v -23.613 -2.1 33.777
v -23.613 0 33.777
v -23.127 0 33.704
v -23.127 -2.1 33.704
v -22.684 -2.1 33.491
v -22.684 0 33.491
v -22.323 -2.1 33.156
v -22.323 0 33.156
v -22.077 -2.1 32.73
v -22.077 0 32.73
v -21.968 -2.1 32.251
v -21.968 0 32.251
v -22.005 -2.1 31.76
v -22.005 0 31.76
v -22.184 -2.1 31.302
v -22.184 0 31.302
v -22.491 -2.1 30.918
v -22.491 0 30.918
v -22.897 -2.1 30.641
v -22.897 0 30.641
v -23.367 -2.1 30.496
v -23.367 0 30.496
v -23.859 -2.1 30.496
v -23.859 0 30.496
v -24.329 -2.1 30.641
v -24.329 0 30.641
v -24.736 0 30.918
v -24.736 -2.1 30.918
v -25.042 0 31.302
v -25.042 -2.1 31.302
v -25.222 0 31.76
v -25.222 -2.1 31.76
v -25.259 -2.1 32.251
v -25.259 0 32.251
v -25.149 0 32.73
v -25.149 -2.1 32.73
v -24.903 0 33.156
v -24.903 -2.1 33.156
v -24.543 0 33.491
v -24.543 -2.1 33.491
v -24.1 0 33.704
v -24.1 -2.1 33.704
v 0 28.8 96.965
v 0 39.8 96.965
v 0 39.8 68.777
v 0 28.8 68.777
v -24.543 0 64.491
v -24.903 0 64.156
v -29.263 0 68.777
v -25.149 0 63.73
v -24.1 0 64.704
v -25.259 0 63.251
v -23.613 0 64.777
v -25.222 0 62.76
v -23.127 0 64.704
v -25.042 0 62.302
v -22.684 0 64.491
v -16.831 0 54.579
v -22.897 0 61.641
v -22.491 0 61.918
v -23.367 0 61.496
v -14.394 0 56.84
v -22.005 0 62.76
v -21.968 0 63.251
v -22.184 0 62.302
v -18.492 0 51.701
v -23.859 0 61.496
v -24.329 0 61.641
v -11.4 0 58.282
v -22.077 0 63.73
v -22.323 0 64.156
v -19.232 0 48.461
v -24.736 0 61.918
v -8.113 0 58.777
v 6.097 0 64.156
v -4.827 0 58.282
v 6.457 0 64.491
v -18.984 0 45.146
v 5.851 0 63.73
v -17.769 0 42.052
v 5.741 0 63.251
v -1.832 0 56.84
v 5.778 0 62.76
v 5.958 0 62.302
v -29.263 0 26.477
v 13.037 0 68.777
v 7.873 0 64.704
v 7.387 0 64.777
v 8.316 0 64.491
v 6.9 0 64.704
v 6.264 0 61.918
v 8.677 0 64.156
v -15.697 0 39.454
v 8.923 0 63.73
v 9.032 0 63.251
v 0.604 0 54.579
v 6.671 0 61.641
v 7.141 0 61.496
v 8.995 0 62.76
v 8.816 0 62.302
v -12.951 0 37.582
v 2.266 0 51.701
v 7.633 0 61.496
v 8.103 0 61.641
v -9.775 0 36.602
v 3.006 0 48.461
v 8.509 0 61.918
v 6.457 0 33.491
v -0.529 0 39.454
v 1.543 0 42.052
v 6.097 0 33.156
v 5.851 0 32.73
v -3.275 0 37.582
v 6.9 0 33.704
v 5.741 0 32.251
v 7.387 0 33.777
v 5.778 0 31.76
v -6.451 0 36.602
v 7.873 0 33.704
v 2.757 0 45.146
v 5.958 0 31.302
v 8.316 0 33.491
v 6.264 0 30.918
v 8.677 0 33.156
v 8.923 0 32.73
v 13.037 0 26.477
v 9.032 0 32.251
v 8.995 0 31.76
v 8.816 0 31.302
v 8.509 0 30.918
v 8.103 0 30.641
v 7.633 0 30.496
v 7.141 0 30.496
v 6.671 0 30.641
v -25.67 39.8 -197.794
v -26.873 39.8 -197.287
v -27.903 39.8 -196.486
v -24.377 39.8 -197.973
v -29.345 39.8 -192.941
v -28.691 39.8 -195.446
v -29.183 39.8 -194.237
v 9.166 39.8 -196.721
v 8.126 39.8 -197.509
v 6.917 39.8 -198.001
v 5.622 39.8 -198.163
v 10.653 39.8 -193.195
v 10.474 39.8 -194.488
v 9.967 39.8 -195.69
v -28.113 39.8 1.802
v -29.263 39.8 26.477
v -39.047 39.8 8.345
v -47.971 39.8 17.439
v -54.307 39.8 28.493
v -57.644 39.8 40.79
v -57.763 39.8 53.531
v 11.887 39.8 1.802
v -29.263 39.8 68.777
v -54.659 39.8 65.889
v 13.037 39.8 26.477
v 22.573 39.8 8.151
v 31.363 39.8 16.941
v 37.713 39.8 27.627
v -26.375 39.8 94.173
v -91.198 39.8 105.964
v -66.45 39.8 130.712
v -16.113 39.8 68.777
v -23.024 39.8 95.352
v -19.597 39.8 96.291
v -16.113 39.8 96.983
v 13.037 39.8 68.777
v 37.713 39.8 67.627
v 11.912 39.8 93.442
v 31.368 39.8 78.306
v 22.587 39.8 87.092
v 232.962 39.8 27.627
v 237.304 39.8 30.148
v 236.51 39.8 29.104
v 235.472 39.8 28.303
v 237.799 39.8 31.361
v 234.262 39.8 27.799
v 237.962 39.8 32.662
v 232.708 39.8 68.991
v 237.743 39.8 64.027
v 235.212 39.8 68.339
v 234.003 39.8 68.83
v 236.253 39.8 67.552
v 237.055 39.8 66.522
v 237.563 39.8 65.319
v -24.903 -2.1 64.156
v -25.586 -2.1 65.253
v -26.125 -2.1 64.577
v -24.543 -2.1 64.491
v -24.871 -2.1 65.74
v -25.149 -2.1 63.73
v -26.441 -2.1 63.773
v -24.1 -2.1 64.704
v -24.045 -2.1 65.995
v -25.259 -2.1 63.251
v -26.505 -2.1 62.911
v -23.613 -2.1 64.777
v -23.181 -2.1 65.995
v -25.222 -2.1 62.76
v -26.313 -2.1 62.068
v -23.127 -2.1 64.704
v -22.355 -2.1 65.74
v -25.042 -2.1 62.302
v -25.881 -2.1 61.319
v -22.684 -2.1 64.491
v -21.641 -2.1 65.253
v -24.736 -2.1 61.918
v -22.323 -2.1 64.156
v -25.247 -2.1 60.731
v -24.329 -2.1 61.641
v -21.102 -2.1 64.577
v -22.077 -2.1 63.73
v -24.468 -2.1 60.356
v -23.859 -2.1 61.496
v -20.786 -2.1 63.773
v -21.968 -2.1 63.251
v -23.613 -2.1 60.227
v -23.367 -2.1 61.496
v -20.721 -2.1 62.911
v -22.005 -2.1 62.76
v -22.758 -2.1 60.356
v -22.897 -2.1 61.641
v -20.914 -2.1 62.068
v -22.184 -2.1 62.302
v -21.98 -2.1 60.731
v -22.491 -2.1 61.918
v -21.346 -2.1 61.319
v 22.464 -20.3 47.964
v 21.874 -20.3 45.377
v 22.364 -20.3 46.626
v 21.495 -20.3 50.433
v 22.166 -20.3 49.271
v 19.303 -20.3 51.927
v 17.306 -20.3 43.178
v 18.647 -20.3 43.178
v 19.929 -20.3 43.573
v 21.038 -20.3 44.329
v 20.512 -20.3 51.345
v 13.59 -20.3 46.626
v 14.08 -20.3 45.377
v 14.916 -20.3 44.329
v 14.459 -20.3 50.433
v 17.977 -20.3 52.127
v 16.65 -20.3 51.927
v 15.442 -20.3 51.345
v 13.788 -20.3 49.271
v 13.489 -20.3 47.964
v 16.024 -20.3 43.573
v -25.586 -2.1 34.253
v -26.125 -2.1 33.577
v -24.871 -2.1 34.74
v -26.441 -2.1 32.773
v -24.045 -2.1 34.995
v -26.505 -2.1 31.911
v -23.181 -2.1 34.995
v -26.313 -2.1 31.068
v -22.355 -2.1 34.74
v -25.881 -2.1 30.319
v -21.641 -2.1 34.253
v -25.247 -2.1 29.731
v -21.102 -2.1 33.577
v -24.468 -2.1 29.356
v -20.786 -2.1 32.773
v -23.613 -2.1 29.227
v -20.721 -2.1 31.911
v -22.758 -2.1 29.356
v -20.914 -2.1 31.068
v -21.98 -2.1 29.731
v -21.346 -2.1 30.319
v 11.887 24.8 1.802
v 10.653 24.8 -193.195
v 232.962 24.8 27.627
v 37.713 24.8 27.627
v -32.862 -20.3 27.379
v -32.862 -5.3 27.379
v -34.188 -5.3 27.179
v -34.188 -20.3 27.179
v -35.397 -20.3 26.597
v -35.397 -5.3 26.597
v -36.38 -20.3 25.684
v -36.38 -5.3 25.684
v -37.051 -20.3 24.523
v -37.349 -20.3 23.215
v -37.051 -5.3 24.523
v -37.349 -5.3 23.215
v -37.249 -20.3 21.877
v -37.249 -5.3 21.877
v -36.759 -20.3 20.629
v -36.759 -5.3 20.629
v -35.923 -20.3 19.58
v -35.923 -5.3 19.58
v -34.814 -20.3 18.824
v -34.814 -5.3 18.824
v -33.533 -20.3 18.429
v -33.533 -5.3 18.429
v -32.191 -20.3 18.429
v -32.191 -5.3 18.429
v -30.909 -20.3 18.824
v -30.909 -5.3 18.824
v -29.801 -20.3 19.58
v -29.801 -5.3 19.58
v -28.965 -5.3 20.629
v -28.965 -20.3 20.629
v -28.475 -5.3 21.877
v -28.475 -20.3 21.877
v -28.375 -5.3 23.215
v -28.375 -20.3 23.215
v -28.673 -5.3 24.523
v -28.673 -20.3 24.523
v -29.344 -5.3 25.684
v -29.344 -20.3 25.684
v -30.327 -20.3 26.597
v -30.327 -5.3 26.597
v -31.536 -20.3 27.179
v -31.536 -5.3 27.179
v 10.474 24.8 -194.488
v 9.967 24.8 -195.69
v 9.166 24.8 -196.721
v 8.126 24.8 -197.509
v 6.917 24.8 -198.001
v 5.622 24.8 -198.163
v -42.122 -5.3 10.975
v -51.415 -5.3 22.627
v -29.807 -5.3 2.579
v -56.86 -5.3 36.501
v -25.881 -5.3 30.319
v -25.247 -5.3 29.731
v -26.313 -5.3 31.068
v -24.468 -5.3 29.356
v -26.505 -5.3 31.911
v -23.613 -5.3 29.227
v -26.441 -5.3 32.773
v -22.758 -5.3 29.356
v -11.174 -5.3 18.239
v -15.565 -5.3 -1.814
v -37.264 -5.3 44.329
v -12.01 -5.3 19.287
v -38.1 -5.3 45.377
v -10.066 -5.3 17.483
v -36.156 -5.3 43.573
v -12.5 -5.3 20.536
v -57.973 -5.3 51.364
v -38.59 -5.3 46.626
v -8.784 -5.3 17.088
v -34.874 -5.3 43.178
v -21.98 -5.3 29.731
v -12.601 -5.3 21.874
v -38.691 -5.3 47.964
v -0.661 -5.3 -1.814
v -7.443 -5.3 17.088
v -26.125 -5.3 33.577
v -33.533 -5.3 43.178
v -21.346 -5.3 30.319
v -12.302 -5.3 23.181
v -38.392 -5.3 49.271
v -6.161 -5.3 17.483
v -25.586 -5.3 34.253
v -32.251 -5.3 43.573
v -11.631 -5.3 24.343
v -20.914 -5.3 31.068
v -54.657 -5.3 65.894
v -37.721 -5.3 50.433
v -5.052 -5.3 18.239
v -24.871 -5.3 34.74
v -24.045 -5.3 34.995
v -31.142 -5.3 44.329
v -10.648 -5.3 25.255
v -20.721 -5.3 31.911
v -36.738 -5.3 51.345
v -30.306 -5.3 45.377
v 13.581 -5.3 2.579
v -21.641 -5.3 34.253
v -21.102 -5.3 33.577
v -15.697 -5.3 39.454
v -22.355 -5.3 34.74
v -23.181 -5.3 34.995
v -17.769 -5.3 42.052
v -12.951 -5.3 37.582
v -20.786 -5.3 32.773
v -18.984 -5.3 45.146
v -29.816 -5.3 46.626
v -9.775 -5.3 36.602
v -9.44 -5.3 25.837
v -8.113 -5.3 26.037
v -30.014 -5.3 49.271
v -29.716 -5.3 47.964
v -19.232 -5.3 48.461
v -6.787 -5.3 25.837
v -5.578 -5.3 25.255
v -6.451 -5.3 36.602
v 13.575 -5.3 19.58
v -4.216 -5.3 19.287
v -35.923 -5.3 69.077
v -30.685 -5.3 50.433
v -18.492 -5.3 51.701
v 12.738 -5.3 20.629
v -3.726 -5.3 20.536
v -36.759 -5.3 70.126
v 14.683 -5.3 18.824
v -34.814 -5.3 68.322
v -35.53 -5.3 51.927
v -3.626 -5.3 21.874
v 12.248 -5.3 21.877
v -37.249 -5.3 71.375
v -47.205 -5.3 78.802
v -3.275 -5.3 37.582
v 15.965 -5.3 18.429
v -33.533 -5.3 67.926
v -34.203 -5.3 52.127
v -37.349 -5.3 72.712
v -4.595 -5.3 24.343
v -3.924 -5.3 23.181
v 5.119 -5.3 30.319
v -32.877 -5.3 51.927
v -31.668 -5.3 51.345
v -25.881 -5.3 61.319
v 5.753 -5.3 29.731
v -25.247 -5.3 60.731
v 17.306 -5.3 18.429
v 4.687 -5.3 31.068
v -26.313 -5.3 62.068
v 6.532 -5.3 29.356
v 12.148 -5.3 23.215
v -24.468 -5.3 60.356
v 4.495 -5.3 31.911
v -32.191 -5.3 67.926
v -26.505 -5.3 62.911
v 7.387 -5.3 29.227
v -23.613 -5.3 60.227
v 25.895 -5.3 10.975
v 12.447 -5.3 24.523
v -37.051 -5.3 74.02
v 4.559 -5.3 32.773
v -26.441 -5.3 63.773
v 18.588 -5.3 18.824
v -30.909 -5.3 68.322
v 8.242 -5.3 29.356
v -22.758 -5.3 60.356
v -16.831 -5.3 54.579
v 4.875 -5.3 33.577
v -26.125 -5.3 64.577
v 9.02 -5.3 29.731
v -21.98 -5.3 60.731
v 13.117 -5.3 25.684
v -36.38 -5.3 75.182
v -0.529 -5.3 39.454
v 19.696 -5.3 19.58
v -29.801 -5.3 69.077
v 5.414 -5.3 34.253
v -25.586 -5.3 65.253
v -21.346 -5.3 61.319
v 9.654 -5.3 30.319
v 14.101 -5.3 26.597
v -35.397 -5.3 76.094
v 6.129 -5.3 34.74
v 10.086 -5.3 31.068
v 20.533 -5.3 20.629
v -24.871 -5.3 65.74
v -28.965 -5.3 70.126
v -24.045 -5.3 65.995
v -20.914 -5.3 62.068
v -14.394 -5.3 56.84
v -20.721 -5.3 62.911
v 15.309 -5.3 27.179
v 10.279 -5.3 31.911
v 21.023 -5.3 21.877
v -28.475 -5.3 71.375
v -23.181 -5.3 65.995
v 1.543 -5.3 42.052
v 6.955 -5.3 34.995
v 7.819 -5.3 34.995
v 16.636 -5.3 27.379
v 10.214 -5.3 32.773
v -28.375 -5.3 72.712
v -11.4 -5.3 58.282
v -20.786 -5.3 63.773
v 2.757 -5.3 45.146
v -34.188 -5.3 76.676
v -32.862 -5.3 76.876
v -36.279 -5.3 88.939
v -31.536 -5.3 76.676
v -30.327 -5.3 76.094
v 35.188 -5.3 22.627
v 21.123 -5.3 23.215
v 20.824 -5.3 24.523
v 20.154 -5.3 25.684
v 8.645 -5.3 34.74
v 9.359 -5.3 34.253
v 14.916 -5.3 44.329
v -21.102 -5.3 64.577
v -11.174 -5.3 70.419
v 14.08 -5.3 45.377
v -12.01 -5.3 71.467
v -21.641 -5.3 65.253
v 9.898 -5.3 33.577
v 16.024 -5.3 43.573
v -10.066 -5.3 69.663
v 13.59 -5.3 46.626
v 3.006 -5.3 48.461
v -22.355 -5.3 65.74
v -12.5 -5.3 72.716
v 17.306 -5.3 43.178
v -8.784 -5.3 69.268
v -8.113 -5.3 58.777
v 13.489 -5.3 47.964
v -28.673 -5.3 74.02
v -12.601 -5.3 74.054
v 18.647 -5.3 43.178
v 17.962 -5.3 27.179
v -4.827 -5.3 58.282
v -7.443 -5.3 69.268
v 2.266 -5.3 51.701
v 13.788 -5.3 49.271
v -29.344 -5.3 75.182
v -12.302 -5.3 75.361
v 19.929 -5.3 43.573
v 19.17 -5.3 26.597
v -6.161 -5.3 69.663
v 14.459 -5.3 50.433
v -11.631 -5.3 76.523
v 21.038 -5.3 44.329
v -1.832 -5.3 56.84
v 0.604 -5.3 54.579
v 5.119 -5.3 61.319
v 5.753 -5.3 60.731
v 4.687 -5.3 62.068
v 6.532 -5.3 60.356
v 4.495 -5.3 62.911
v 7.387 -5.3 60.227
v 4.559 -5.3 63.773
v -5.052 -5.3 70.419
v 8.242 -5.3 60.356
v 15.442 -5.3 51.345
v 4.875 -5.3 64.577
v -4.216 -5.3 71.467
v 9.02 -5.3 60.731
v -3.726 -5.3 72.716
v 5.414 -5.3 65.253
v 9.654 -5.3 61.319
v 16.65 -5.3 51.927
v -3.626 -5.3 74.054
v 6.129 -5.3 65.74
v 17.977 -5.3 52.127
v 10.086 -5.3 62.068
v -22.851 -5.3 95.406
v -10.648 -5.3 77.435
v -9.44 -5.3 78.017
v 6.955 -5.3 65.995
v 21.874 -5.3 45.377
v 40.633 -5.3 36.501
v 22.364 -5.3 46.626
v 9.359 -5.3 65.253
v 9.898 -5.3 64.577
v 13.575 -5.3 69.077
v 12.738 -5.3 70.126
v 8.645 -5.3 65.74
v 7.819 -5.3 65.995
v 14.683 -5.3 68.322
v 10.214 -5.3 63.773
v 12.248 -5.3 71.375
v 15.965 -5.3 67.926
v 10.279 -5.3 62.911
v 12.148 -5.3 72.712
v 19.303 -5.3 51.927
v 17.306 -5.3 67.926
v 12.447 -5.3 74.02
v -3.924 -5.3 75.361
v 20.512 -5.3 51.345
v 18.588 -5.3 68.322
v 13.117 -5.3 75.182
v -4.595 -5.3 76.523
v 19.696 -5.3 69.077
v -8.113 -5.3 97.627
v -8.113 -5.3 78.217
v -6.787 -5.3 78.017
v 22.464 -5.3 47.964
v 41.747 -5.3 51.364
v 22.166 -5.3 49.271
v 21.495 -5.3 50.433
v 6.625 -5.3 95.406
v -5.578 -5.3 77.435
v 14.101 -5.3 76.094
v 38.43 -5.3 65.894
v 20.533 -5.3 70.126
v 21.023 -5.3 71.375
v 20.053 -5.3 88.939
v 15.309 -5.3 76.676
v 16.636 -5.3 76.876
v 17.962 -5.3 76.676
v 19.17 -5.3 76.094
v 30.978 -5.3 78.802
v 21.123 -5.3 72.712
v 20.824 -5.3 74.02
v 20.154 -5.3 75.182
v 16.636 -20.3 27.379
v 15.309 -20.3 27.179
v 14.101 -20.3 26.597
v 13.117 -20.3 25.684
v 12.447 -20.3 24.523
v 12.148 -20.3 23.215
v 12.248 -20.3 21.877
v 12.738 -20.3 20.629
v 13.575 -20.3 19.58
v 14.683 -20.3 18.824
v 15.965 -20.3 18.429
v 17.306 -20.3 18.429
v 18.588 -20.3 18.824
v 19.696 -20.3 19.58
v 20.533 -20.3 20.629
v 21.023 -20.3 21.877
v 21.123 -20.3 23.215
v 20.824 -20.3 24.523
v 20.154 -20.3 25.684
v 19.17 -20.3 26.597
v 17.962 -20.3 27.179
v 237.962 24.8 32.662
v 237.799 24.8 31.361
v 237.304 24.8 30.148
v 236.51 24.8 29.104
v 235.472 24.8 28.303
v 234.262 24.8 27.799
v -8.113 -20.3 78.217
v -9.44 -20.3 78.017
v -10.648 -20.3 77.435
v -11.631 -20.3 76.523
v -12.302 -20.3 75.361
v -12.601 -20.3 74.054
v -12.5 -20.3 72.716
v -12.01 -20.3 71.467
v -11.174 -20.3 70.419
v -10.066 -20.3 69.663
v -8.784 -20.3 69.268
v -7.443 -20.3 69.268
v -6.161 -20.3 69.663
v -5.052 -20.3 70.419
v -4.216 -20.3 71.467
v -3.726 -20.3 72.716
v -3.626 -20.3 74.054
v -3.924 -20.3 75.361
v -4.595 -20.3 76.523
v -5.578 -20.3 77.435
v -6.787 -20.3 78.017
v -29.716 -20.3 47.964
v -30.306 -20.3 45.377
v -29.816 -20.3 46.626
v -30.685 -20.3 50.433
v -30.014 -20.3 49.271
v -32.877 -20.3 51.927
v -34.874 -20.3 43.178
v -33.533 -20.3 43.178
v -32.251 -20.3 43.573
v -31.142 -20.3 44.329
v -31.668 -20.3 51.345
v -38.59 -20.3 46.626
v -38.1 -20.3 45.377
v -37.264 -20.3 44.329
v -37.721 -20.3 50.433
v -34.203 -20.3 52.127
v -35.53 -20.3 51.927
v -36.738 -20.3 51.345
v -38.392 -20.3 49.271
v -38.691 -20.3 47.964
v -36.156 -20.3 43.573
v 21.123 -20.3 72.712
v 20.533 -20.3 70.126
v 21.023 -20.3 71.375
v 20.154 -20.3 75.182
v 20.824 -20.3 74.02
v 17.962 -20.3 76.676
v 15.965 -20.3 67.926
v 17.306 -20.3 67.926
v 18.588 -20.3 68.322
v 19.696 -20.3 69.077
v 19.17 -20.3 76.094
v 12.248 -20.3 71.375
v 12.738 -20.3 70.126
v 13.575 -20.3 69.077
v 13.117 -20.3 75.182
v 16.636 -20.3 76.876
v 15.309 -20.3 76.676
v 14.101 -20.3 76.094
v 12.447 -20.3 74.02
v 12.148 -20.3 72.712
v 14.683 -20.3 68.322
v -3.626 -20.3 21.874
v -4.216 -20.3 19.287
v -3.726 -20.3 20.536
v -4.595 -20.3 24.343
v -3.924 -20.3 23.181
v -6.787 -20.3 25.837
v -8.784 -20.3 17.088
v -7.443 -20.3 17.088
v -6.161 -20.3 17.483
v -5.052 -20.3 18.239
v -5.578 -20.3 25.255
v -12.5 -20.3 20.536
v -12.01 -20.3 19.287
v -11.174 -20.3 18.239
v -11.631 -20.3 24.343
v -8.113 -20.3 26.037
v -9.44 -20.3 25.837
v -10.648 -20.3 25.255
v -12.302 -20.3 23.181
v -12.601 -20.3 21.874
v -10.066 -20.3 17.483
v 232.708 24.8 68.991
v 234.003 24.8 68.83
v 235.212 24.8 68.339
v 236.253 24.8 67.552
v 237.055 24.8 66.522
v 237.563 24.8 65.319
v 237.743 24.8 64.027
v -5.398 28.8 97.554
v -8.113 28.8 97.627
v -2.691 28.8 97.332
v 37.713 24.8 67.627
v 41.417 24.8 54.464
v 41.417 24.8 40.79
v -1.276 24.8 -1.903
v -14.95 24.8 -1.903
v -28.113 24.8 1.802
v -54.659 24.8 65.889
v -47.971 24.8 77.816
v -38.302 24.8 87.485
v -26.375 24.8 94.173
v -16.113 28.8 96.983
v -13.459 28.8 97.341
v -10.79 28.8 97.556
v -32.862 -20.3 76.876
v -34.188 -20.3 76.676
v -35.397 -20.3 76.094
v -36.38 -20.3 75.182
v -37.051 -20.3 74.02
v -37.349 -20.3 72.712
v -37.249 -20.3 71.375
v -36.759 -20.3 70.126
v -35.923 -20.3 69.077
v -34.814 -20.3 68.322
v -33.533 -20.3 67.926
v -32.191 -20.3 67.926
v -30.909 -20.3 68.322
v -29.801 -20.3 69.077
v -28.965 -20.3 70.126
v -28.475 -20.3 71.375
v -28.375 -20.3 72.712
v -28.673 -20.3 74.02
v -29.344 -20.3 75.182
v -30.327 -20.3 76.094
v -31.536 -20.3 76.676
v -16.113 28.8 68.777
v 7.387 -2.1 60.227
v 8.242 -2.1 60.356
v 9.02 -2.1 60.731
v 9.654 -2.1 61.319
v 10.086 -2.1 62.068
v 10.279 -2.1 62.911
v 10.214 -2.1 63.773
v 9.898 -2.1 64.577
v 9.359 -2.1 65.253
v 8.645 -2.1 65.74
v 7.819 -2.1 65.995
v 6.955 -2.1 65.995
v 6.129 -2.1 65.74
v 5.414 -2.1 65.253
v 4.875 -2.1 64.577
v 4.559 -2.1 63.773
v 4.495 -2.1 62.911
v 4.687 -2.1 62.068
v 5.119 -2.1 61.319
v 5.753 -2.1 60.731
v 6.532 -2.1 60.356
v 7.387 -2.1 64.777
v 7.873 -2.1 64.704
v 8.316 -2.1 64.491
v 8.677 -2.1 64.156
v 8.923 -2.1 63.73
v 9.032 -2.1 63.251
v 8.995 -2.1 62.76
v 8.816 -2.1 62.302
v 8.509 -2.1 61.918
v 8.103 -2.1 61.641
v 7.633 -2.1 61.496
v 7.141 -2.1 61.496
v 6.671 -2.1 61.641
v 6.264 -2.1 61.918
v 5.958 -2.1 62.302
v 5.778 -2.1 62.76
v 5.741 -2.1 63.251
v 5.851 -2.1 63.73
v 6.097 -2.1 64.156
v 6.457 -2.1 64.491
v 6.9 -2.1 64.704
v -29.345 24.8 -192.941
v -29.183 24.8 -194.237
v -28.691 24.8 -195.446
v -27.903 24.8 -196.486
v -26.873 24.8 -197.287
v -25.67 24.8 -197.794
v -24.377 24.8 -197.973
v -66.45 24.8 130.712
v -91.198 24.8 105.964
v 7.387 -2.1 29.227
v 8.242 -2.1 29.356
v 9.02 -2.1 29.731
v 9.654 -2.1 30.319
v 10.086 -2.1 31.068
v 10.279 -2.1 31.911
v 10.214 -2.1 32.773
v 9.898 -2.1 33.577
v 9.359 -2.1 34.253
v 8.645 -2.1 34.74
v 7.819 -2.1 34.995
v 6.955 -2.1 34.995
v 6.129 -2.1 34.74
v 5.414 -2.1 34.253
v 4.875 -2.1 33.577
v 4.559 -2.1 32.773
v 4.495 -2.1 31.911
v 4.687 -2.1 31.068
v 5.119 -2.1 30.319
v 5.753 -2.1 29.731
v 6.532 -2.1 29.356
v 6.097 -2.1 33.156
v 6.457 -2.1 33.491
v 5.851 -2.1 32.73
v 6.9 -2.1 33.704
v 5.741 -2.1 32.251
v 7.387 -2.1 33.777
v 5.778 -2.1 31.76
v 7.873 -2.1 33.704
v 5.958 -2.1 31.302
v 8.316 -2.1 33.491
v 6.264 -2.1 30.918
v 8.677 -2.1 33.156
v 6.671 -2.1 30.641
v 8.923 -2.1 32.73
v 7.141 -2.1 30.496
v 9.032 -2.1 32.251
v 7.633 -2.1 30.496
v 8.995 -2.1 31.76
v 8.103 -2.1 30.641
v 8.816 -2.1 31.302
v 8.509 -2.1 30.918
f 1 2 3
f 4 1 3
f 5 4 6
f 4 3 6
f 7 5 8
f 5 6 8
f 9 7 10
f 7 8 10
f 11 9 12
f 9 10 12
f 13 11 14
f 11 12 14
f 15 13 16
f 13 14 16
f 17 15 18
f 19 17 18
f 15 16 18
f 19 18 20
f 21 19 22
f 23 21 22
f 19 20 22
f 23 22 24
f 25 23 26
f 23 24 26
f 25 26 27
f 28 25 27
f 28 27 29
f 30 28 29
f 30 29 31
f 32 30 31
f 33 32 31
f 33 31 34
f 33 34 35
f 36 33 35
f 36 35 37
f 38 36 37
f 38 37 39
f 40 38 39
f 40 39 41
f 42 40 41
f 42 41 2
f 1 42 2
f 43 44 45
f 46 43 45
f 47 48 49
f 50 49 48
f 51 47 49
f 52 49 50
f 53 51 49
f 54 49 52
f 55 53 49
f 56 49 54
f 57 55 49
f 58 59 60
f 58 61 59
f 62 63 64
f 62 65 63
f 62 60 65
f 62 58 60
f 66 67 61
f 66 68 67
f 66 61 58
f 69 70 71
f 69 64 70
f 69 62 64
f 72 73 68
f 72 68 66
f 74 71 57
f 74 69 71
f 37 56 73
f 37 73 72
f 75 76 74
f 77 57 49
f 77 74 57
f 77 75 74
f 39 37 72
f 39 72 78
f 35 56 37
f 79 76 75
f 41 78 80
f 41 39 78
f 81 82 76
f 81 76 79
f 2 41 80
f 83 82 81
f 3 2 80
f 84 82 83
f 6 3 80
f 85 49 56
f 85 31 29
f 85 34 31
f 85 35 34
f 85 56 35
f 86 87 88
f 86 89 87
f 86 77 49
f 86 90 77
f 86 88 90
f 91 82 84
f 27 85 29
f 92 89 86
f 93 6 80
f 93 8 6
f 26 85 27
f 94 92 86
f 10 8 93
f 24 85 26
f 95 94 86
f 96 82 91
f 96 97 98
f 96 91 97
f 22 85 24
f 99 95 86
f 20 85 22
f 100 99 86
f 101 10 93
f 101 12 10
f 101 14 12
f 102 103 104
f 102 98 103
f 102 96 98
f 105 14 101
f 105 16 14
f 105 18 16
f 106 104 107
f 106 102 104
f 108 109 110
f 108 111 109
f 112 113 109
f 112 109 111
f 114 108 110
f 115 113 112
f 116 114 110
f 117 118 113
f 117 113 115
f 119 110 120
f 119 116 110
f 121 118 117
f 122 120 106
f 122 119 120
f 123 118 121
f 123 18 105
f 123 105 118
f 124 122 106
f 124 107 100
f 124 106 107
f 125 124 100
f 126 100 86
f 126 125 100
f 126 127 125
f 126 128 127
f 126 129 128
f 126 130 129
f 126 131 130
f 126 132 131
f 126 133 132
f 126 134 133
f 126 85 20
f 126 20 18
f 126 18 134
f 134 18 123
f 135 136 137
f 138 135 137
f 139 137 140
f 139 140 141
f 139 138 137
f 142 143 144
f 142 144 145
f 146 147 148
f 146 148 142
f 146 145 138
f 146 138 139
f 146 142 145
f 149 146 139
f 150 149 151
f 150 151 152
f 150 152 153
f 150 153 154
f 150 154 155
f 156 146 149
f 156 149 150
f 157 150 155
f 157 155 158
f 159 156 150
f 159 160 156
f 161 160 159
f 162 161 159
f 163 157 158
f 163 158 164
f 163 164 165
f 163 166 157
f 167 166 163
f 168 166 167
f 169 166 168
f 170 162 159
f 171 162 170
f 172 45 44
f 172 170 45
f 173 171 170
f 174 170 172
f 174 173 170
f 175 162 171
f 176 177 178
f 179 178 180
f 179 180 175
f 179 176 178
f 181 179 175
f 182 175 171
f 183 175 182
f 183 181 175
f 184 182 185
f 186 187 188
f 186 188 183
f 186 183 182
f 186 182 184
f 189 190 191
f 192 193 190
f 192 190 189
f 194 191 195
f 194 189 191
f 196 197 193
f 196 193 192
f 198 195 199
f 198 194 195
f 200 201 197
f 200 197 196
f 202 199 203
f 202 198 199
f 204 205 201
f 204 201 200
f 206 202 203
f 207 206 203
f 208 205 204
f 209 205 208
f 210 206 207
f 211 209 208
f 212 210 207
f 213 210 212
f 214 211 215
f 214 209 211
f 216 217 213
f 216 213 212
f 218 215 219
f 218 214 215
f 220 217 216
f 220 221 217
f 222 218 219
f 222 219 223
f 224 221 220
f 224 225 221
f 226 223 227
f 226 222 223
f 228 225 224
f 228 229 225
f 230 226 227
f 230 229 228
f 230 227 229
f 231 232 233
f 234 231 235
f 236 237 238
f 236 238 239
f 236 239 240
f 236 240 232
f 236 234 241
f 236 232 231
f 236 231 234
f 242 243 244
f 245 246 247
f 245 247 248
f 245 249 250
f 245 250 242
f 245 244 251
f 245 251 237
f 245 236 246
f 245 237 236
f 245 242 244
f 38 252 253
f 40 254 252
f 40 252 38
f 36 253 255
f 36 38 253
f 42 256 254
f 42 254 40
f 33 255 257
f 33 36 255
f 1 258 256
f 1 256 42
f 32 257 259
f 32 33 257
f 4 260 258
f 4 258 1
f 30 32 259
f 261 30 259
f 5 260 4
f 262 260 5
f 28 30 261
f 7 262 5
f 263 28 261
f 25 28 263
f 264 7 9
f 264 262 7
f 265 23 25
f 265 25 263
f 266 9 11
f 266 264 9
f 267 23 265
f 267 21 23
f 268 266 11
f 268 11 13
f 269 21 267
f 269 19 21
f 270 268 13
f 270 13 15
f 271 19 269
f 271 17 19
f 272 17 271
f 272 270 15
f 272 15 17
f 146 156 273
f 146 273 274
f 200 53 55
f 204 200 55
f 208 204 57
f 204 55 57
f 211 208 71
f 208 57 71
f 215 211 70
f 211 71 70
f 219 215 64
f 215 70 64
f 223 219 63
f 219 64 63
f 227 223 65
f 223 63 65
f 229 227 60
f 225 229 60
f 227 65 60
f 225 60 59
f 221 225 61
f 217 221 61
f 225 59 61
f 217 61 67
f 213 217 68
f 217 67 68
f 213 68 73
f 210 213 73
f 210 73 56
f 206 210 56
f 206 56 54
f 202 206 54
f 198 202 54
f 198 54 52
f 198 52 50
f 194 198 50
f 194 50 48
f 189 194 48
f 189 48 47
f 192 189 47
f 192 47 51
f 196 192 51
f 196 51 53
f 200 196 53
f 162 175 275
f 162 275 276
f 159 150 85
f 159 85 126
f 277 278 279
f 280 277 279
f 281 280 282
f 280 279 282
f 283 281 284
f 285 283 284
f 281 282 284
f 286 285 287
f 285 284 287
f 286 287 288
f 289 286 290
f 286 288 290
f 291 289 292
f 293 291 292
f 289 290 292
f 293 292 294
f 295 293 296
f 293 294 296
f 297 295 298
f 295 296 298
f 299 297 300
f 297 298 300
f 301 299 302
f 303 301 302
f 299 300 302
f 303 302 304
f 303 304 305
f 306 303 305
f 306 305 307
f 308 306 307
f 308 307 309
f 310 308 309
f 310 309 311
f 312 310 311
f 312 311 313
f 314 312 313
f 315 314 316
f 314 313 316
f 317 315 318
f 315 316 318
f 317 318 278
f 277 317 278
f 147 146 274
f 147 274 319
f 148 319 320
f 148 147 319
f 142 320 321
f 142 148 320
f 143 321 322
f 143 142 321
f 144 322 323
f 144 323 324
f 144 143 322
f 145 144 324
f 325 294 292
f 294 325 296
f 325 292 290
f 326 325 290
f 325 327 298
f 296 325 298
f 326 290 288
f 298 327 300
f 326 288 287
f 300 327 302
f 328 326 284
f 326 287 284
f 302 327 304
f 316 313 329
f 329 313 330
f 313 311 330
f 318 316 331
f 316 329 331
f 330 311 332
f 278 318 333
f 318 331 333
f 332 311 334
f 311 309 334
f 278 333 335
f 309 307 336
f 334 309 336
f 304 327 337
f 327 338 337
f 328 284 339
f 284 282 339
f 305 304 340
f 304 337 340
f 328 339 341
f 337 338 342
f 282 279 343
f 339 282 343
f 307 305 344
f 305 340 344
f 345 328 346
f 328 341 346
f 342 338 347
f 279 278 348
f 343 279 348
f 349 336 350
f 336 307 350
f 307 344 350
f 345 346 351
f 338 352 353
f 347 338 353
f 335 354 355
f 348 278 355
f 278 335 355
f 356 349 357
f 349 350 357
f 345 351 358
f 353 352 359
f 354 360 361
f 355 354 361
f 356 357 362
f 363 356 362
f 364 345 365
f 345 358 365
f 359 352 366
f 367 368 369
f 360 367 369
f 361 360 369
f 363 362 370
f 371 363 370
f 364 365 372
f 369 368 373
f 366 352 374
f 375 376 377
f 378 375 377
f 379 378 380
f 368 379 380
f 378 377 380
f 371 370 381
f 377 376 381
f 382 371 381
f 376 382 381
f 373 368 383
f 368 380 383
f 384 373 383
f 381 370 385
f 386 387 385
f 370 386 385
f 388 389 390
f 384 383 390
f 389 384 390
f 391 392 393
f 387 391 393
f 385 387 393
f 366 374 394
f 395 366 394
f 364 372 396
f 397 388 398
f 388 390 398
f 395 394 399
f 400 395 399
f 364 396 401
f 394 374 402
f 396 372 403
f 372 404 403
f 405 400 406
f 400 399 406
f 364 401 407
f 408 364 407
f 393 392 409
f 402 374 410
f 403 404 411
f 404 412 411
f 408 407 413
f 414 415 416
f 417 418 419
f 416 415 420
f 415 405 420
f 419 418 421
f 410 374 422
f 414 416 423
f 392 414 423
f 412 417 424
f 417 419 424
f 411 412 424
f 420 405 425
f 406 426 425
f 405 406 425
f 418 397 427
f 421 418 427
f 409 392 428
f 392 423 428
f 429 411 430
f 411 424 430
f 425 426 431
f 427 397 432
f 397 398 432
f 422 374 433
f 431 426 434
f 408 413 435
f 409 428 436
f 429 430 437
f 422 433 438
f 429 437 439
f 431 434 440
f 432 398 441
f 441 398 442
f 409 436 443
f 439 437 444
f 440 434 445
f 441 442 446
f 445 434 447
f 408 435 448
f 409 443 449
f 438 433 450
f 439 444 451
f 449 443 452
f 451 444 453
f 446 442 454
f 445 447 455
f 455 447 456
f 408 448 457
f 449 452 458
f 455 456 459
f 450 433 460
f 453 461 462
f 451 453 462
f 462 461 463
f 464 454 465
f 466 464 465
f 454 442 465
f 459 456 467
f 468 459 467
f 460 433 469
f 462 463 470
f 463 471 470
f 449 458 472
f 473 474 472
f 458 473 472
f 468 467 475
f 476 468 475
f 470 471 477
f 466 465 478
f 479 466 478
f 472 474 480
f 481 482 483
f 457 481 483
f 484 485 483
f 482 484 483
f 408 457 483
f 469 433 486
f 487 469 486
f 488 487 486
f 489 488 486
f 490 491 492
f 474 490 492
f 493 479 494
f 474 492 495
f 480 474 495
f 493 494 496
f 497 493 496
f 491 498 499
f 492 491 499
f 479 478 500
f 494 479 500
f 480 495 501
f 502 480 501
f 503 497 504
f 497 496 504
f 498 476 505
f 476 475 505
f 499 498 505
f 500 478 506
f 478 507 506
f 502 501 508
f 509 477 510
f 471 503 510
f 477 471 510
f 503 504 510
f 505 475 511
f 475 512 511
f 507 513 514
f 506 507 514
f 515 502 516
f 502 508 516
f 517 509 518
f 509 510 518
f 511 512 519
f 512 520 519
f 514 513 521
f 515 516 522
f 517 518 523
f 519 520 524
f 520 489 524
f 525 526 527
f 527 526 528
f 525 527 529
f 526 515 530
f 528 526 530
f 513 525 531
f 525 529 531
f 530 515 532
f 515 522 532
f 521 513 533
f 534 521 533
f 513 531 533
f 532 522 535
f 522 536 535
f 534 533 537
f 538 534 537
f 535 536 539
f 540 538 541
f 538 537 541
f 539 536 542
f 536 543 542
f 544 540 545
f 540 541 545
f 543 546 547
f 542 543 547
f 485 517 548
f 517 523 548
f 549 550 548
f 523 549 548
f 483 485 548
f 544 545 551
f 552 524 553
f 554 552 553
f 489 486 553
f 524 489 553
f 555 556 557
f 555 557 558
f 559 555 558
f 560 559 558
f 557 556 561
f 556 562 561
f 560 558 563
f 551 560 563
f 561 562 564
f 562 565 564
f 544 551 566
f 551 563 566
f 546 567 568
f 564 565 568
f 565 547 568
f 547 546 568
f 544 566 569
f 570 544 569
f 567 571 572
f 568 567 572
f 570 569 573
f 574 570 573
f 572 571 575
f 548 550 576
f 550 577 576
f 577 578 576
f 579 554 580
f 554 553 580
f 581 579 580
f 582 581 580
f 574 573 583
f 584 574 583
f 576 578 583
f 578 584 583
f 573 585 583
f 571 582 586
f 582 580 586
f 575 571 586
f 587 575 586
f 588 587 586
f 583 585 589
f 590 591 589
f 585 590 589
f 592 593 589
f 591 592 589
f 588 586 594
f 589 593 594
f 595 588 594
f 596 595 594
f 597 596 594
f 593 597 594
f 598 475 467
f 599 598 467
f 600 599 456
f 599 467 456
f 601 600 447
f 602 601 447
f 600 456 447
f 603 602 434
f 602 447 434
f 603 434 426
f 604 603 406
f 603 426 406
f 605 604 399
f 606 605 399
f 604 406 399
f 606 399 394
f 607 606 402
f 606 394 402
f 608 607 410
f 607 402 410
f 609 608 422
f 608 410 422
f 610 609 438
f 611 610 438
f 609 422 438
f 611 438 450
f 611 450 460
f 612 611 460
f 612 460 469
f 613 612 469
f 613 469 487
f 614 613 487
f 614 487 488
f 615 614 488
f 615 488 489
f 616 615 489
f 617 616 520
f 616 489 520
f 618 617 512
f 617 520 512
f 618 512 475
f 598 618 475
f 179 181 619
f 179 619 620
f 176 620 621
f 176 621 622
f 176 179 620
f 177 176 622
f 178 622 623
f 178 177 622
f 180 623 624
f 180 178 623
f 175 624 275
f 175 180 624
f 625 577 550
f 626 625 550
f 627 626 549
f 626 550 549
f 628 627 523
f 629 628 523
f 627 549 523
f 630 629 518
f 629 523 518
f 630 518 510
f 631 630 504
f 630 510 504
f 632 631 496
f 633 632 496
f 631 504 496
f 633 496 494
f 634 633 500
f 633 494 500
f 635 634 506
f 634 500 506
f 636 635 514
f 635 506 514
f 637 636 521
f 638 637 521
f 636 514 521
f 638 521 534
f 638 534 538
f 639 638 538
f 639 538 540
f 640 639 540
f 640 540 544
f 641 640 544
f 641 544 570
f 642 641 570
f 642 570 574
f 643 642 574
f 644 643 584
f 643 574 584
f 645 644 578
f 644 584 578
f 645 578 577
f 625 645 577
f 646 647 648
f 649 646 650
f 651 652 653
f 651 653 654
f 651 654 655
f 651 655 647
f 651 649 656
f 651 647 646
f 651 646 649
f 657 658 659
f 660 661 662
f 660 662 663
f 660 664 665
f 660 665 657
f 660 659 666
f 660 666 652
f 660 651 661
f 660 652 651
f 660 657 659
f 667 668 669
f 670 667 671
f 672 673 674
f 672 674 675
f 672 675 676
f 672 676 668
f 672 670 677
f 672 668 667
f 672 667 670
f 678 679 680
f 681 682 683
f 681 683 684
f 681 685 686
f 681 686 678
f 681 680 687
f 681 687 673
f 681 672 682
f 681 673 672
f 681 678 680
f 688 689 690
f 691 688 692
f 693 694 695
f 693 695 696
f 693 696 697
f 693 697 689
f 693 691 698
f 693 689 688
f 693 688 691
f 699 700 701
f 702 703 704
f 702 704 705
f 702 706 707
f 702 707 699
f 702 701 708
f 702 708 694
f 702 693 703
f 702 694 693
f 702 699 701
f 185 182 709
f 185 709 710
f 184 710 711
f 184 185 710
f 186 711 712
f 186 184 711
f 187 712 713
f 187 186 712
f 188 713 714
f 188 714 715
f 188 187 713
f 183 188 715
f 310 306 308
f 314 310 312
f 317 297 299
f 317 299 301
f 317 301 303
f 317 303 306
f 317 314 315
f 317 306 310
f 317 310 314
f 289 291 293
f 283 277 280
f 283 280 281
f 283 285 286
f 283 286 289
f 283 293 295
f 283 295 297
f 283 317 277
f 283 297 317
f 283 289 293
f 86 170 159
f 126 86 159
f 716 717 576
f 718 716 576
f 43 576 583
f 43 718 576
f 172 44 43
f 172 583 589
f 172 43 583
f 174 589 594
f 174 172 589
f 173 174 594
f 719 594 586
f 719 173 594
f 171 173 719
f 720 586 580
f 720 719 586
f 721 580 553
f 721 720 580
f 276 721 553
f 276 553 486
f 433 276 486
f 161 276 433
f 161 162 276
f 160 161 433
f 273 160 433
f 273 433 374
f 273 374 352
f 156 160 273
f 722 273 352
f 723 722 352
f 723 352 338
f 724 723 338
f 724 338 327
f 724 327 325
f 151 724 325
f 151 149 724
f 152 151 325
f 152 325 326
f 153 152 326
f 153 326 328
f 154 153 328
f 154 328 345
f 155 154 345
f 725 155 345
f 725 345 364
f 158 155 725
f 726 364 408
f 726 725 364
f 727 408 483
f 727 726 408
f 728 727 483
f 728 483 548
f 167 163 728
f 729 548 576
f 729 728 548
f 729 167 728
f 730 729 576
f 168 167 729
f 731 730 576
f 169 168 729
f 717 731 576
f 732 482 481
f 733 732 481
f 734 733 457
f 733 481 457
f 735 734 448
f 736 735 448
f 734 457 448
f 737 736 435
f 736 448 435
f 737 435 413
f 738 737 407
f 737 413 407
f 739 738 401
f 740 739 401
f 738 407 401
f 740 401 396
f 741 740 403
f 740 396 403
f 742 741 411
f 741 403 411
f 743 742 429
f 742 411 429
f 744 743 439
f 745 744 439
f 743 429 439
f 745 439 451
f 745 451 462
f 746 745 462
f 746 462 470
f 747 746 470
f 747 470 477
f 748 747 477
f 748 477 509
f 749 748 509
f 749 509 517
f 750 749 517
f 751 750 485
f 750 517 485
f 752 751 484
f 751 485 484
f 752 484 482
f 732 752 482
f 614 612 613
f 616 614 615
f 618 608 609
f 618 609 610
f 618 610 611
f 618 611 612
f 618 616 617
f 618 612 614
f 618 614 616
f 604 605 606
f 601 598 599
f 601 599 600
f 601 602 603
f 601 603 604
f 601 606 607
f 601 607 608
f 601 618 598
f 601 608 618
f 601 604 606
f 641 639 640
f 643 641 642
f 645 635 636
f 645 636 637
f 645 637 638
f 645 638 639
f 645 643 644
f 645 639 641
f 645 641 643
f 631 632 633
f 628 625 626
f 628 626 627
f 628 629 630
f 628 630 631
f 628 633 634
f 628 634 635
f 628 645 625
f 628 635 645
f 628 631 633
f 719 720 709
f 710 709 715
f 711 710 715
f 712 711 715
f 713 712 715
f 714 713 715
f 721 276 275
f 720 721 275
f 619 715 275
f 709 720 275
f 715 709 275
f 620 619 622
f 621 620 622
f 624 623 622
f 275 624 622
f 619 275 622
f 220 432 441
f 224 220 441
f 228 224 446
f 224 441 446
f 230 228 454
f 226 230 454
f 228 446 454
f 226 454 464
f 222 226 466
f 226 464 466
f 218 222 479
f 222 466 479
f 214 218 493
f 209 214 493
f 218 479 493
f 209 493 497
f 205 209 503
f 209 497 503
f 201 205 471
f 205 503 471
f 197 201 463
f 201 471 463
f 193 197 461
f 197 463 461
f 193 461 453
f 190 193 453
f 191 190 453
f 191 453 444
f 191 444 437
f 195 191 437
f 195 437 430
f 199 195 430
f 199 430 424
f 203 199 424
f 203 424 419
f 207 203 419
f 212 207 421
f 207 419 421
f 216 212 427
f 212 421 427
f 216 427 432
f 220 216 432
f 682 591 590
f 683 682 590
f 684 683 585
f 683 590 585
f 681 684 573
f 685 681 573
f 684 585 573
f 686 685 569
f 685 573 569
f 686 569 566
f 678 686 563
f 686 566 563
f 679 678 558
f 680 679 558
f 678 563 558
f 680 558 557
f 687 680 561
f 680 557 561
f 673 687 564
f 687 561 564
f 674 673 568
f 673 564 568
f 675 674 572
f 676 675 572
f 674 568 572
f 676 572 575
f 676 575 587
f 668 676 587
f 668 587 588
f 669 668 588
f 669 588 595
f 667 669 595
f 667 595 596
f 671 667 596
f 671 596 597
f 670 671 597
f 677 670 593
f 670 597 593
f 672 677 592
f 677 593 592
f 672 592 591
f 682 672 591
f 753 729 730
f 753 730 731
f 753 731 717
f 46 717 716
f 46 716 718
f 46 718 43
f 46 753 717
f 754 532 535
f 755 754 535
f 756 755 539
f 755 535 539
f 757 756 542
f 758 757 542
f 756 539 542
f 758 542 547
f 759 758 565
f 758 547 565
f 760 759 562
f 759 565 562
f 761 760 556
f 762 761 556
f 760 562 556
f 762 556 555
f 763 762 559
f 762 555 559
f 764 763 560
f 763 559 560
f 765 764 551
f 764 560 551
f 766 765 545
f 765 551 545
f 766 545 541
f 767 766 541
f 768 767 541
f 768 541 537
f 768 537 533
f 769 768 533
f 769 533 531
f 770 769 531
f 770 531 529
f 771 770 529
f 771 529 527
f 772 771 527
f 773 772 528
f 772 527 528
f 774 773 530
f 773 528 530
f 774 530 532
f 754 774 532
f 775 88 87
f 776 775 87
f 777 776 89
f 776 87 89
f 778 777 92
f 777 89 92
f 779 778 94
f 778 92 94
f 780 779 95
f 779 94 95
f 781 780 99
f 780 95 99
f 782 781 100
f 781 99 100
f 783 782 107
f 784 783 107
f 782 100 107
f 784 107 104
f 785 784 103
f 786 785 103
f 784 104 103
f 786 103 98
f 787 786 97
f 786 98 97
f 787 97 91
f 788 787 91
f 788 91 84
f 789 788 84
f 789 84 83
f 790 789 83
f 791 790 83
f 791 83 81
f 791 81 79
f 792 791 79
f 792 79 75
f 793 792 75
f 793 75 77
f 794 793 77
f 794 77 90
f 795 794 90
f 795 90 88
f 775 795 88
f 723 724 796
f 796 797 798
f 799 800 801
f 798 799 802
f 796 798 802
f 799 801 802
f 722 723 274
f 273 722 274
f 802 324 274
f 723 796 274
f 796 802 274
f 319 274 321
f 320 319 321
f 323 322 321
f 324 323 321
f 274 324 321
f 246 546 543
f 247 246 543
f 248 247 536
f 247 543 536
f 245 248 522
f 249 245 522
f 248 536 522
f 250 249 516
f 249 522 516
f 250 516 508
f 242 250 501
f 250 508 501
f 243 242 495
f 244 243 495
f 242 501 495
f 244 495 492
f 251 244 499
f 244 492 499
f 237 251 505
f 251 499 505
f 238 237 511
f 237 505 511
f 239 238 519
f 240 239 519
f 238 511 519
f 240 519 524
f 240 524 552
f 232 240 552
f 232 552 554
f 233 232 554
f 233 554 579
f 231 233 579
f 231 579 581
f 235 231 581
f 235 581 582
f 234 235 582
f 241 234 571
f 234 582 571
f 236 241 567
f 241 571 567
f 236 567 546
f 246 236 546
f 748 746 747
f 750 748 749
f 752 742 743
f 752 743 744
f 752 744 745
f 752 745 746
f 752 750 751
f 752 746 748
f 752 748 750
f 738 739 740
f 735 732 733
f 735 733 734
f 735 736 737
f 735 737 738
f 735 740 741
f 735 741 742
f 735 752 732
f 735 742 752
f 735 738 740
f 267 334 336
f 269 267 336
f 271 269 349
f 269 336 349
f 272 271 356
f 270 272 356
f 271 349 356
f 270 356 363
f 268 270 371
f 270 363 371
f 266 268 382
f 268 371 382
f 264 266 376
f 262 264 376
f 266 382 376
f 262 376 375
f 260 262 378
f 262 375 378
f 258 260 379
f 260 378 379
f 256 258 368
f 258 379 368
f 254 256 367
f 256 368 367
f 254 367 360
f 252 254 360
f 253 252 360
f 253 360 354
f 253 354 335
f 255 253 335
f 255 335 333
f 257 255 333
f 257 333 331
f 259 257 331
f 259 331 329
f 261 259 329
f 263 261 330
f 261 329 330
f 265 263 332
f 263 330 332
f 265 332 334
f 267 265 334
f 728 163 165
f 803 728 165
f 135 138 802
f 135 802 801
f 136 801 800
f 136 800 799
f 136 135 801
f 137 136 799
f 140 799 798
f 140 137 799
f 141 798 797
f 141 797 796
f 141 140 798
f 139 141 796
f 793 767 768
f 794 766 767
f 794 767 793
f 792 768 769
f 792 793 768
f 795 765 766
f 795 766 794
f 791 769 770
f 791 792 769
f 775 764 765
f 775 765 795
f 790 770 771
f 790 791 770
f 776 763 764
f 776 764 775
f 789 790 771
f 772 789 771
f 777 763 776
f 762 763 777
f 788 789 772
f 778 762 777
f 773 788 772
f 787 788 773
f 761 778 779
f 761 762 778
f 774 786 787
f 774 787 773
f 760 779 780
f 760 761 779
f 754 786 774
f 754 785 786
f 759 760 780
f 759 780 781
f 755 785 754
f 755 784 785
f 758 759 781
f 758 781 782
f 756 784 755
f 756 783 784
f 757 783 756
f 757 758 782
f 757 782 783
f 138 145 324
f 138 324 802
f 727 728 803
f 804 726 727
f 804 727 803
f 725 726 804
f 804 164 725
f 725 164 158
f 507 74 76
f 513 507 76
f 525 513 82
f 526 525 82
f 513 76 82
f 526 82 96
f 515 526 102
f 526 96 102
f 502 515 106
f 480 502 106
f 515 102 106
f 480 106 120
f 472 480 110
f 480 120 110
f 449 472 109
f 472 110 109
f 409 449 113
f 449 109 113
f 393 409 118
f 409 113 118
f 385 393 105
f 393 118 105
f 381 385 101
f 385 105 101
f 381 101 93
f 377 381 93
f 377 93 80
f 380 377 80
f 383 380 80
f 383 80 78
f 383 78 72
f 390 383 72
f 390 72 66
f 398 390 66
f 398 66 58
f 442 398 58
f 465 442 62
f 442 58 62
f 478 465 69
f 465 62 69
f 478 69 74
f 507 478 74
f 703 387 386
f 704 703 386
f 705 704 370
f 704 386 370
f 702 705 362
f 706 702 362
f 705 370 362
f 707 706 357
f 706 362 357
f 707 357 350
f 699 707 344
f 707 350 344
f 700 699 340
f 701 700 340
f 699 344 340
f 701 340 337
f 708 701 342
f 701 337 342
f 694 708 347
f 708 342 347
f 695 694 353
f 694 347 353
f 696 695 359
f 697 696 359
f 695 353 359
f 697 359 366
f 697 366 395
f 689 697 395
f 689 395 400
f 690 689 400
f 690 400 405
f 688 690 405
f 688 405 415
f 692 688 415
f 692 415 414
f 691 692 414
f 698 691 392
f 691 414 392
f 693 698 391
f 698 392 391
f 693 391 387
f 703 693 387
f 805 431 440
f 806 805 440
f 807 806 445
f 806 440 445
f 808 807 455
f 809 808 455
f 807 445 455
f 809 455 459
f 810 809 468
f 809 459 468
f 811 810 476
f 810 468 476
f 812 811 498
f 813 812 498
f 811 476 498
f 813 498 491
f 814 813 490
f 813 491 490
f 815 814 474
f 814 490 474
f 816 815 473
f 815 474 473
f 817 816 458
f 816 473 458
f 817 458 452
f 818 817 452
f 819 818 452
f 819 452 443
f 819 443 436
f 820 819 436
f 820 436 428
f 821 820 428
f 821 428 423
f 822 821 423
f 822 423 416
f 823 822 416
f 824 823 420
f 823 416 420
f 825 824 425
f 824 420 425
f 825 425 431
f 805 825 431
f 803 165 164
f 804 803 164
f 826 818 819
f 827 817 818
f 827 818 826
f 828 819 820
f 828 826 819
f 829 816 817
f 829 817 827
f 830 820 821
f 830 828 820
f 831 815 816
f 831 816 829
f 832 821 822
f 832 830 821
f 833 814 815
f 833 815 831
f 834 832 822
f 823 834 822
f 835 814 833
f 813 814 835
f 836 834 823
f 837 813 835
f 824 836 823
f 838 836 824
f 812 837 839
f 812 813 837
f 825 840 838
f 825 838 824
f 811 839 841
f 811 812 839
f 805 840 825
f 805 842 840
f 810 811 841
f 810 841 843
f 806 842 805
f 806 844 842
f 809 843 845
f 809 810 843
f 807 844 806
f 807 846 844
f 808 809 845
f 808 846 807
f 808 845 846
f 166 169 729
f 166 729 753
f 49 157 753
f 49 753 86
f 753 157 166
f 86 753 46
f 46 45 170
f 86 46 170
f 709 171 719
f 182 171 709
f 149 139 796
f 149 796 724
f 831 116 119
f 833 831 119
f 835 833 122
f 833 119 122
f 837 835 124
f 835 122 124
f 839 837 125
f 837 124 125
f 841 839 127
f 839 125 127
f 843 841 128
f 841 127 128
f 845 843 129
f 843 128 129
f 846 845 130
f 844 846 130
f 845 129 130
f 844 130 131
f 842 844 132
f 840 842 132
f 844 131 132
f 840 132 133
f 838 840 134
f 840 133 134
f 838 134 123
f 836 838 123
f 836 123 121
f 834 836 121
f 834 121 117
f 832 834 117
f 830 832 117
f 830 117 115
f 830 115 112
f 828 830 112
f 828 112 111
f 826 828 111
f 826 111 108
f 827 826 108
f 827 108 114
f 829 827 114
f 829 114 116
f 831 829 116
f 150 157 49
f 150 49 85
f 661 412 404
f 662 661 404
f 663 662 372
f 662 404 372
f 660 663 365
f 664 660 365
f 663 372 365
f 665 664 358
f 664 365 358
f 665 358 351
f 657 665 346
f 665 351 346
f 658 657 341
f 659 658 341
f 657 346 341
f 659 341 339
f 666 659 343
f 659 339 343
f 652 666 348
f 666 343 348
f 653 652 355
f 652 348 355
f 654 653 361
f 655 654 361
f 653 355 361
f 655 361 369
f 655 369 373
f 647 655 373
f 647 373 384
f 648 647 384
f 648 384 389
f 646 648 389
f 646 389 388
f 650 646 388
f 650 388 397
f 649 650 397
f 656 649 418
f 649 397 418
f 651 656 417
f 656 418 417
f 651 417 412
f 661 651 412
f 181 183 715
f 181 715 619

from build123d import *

# Parameters (mm, degrees)
SKETCH4_R           = 50
BOSS_EXTRUDE3_DEPTH = 45.1
SKETCH16_R          = 4.5
BOSS_EXTRUDE5_DEPTH = 15
CUT_EXTRUDE1_DEPTH  = 39.8
SKETCH7_W           = 16.113230219
SKETCH7_H           = 35.470323835
CUT_EXTRUDE3_DEPTH  = 11
SKETCH8_R           = 11.15
SKETCH8_R_2         = 1.65
CUT_EXTRUDE4_DEPTH  = 5.3
SKETCH9_R           = 2.9
CUT_EXTRUDE5_DEPTH  = 3.2
BOSS_EXTRUDE4_DEPTH = 15


with BuildPart() as part:
    # Sketch4 → Boss-Extrude3 (new body)
    with BuildSketch(Plane(origin=(0, 39.8, 0), x_dir=(1, 0, 0), z_dir=(0, 1, 0))):
        with Locations((-8.113230219, -47.62731131)):
            Circle(SKETCH4_R)
    extrude(amount=-BOSS_EXTRUDE3_DEPTH)

    # Sketch16 → Boss-Extrude5 (add)
    with BuildSketch(Plane.XZ.offset(5.3)):
        with Locations((-8.113230219, 21.53731131)):
            Circle(SKETCH16_R)
        with Locations((17.976769781, 47.62731131)):
            Circle(SKETCH16_R)
        with Locations((-8.113230219, 73.71731131)):
            Circle(SKETCH16_R)
        with Locations((-34.203230219, 47.62731131)):
            Circle(SKETCH16_R)
        with Locations((-32.86196756, 22.878573969)):
            Circle(SKETCH16_R)
        with Locations((16.635507123, 22.878573969)):
            Circle(SKETCH16_R)
        with Locations((16.635507123, 72.376048652)):
            Circle(SKETCH16_R)
        with Locations((-32.86196756, 72.376048652)):
            Circle(SKETCH16_R)
    extrude(amount=BOSS_EXTRUDE5_DEPTH)

    # Sketch5 → Cut-Extrude1 (cut)
    with BuildSketch(Plane(origin=(0, 39.8, 0), x_dir=(1, 0, 0), z_dir=(0, 1, 0))):
        Polygon((13.036769781, -26.47731131), (-29.263230219, -26.47731131), (-29.263230219, -68.77731131), (-16.113230219, -68.77731131), (-0.113230219, -68.77731131), (13.036769781, -68.77731131), align=None)
    extrude(amount=-CUT_EXTRUDE1_DEPTH, mode=Mode.SUBTRACT)

    # Sketch7 → Cut-Extrude3 (cut)
    with BuildSketch(Plane(origin=(0, 39.8, 0), x_dir=(1, 0, 0), z_dir=(0, 1, 0))):
        with Locations((-8.05661511, -86.512473228)):
            Rectangle(SKETCH7_W, SKETCH7_H)
    extrude(amount=-CUT_EXTRUDE3_DEPTH, mode=Mode.SUBTRACT)

    # Sketch8 → Cut-Extrude4 (cut)
    with BuildSketch(Plane(origin=(0, 0, 0), x_dir=(1, 0, 0), z_dir=(0, 1, 0))):
        with Locations((-8.113230219, -47.62731131)):
            Circle(SKETCH8_R)
        with Locations((7.386769781, -32.12731131)):
            Circle(SKETCH8_R_2)
        with Locations((7.386769781, -63.12731131)):
            Circle(SKETCH8_R_2)
        with Locations((-23.613230219, -63.12731131)):
            Circle(SKETCH8_R_2)
        with Locations((-23.613230219, -32.12731131)):
            Circle(SKETCH8_R_2)
    extrude(amount=-CUT_EXTRUDE4_DEPTH, mode=Mode.SUBTRACT)

    # Sketch9 → Cut-Extrude5 (cut)
    with BuildSketch(Plane.XZ.offset(5.3)):
        with Locations((-23.613230219, 32.12731131)):
            Circle(SKETCH9_R)
        with Locations((-23.613230219, 63.12731131)):
            Circle(SKETCH9_R)
        with Locations((7.386769781, 63.12731131)):
            Circle(SKETCH9_R)
        with Locations((7.386769781, 32.12731131)):
            Circle(SKETCH9_R)
    extrude(amount=-CUT_EXTRUDE5_DEPTH, mode=Mode.SUBTRACT)

    # Sketch11 → Boss-Extrude4 (add)
    with BuildSketch(Plane(origin=(0, 39.8, 0), x_dir=(1, 0, 0), z_dir=(0, 1, 0))):
        with BuildLine():
            Line((232.962144958, -27.62731131), (37.712526731, -27.62731131))
            ThreePointArc((37.712526731, -27.62731131), (41.886769781, -47.62731131), (37.712526731, -67.62731131))
            Line((37.712526731, -67.62731131), (232.707755381, -68.991424164))
            ThreePointArc((232.707755381, -68.991424164), (236.253447378, -67.551726556), (237.742610291, -64.026523759))
            Line((237.742610291, -64.026523759), (237.962022615, -32.662288563))
            ThreePointArc((237.962022615, -32.662288563), (236.510023638, -29.104165434), (232.962144958, -27.62731131))
        make_face()
        with BuildLine():
            Line((-29.345351576, 192.94147664), (-28.113230219, -1.801554361))
            ThreePointArc((-28.113230219, -1.801554361), (-8.113230219, 2.37268869), (11.886769781, -1.801554361))
            Line((11.886769781, -1.801554361), (10.653047297, 193.194542854))
            ThreePointArc((10.653047297, 193.194542854), (9.166241961, 196.720740641), (5.621513459, 198.162808872))
            Line((5.621513459, 198.162808872), (-24.377085557, 197.973010478))
            ThreePointArc((-24.377085557, 197.973010478), (-27.903283344, 196.486205142), (-29.345351576, 192.94147664))
        make_face()
        with BuildLine():
            ThreePointArc((-26.374798087, -94.173150426), (-43.468569278, -82.98265037), (-54.659069334, -65.888879179))
            Line((-54.659069334, -65.888879179), (-91.198277008, -105.963620758))
            Line((-91.198277008, -105.963620758), (-66.449539667, -130.7123581))
            Line((-66.449539667, -130.7123581), (-26.374798087, -94.173150426))
        make_face()
    extrude(amount=-BOSS_EXTRUDE4_DEPTH)


solid = part.part
